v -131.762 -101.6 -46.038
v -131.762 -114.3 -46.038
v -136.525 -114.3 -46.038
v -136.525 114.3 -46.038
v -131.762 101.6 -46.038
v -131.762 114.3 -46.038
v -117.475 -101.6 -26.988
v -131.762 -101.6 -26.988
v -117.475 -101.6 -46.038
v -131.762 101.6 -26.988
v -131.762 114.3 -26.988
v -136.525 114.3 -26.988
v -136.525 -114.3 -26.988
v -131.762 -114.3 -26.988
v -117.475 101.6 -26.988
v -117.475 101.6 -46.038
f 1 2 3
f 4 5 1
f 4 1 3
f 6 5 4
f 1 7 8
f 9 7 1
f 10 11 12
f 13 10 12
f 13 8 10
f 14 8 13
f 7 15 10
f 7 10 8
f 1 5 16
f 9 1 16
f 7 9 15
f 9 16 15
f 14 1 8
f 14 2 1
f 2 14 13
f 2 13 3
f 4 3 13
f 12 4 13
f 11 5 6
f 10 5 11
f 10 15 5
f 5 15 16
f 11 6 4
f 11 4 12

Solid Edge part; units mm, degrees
sketch "Sketch1" plane through (-70.6437, 101.6, 0) normal (0, -1, 0) x (1, 0, 0)
  line L0 (-61.1187, -46.0375) -> (-46.8312, -46.0375)
  line L1 (-46.8312, -46.0375) -> (-46.8312, -26.9875)
  line L2 (-46.8312, -26.9875) -> (-61.1187, -26.9875)
  line L3 (-61.1187, -26.9875) -> (-61.1187, -46.0375)
  dimension "D1" = 14.2875
  dimension "D2" = 19.05
extrude "Protrusion1" add sketch "Sketch1" along normal up to vertex (203.2 mm away)
sketch "Sketch2" plane through (-131.7625, 0, -34.1313) normal (-1, 0, 0) x (0, -1, 0)
  line L0 (-114.3, 7.1438) -> (114.3, 7.1438)
  line L1 (114.3, 7.1438) -> (114.3, -11.9063)
  line L2 (114.3, -11.9063) -> (-114.3, -11.9063)
  line L3 (-114.3, -11.9063) -> (-114.3, 7.1438)
  dimension "D1" = 12.7
  dimension "D2" = 12.7
extrude "Protrusion2" add sketch "Sketch2" along normal blind 4.7625
